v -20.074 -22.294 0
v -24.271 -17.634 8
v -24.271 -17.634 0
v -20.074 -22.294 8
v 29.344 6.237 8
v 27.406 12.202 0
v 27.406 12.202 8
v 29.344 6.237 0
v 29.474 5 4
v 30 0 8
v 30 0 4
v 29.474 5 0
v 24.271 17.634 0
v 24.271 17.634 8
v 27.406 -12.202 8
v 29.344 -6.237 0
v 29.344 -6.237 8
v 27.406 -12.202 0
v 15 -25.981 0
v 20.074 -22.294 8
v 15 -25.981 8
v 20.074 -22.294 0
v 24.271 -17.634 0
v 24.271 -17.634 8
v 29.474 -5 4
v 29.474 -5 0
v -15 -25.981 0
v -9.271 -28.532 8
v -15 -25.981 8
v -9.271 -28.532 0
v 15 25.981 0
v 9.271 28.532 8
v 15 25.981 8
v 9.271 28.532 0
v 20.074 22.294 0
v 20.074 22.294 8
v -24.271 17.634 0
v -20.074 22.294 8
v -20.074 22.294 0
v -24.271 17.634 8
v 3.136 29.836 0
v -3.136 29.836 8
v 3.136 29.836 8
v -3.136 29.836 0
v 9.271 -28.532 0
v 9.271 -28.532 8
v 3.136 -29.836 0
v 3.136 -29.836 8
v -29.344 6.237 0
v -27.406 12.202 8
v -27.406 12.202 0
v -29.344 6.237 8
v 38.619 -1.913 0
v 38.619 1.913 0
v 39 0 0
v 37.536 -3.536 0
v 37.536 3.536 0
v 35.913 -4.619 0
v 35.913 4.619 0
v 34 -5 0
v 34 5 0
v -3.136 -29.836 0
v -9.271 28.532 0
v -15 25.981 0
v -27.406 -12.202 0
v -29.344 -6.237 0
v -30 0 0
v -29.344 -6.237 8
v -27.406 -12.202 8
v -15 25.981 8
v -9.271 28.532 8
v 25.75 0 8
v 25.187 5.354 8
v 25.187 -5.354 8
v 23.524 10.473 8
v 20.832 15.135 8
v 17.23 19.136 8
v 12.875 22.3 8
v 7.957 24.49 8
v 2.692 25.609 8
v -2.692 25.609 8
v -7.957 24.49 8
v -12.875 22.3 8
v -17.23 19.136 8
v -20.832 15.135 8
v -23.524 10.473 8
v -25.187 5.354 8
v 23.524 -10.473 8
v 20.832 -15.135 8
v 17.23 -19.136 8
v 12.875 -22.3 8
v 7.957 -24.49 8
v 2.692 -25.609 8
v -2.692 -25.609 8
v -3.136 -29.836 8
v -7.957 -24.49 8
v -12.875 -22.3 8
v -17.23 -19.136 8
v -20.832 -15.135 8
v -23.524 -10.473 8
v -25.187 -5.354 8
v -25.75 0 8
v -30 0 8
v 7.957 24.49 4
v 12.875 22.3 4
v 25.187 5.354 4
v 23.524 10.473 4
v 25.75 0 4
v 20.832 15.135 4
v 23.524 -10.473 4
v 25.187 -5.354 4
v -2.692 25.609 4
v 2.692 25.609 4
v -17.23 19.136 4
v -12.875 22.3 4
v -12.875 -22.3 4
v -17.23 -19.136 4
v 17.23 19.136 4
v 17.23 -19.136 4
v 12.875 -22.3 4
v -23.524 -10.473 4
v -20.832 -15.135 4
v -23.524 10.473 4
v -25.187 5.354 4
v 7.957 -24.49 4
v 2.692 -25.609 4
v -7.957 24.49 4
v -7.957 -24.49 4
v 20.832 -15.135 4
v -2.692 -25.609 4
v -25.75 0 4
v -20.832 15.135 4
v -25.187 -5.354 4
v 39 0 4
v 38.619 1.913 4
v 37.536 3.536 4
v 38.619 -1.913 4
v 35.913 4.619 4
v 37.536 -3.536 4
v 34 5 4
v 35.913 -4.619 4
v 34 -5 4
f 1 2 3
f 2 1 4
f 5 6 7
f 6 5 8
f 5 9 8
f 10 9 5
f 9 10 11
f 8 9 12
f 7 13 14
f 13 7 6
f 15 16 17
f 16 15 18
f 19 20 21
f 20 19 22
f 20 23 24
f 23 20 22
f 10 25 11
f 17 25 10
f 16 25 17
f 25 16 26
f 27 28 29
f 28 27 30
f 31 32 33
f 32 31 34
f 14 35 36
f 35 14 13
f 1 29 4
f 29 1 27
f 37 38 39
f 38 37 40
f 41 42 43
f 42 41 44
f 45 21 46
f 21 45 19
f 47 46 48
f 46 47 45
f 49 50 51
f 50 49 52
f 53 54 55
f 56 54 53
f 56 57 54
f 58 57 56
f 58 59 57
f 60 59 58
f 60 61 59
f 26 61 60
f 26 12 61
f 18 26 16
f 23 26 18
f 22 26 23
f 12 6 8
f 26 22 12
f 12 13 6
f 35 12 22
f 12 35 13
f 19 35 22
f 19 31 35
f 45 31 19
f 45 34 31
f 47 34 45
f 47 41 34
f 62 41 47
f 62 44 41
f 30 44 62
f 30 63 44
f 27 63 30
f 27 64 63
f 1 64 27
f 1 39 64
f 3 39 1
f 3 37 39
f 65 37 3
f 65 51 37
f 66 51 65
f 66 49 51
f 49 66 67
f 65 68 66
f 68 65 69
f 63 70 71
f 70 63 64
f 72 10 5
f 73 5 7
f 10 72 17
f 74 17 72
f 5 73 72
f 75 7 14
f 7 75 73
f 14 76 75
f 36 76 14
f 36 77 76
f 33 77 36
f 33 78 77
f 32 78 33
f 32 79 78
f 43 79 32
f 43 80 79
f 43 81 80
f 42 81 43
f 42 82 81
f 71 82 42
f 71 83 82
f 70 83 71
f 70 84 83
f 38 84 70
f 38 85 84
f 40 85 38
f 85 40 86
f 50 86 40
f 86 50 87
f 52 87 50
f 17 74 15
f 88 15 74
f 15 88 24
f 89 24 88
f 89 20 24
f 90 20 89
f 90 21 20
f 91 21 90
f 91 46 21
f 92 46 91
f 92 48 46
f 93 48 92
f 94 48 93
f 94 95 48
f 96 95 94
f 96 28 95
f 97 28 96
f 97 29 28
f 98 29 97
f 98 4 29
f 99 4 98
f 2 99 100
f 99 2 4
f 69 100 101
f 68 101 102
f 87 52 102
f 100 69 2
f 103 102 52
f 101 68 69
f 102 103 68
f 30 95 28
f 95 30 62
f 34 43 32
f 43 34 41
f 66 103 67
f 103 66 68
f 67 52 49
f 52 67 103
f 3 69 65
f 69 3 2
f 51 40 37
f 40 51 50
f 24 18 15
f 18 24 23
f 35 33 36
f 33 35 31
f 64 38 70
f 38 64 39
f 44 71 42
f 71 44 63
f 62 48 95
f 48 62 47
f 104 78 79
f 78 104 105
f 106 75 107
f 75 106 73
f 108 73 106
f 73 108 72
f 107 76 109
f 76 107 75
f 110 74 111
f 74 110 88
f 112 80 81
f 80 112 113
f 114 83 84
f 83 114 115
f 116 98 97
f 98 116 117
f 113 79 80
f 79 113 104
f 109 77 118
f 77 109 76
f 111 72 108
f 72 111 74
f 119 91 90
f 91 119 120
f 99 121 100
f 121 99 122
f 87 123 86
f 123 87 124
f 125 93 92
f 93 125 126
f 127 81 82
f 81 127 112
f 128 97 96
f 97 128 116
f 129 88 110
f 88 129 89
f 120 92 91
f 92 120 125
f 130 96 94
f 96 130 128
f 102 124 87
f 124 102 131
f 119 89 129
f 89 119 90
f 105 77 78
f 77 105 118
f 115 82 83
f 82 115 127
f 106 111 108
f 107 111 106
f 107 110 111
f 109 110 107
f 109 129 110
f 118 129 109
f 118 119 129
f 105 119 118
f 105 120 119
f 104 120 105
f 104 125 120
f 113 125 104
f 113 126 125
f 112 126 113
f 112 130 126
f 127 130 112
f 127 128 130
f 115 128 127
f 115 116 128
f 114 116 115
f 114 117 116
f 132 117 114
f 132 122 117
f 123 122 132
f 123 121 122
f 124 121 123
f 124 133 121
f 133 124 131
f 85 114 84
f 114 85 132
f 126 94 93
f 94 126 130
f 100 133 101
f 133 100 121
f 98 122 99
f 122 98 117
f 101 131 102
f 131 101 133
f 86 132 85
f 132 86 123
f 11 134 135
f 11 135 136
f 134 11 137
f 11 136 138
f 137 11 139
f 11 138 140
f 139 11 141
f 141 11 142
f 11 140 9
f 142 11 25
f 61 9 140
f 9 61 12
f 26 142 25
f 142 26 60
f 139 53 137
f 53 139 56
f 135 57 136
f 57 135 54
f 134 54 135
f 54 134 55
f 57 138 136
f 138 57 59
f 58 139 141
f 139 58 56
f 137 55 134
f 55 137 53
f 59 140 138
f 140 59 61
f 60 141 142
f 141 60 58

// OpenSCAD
difference()
{
  cylinder(h=8,d=60);
  translate([0,0,4]) cylinder(h=5,d=51.5);
}
translate([28,-5,0]) cube([6,10,4]);
translate([34,0,0]) cylinder(h=4,d=10);

//translate([0,0,2]) cylinder(h=3,d=48.5);
